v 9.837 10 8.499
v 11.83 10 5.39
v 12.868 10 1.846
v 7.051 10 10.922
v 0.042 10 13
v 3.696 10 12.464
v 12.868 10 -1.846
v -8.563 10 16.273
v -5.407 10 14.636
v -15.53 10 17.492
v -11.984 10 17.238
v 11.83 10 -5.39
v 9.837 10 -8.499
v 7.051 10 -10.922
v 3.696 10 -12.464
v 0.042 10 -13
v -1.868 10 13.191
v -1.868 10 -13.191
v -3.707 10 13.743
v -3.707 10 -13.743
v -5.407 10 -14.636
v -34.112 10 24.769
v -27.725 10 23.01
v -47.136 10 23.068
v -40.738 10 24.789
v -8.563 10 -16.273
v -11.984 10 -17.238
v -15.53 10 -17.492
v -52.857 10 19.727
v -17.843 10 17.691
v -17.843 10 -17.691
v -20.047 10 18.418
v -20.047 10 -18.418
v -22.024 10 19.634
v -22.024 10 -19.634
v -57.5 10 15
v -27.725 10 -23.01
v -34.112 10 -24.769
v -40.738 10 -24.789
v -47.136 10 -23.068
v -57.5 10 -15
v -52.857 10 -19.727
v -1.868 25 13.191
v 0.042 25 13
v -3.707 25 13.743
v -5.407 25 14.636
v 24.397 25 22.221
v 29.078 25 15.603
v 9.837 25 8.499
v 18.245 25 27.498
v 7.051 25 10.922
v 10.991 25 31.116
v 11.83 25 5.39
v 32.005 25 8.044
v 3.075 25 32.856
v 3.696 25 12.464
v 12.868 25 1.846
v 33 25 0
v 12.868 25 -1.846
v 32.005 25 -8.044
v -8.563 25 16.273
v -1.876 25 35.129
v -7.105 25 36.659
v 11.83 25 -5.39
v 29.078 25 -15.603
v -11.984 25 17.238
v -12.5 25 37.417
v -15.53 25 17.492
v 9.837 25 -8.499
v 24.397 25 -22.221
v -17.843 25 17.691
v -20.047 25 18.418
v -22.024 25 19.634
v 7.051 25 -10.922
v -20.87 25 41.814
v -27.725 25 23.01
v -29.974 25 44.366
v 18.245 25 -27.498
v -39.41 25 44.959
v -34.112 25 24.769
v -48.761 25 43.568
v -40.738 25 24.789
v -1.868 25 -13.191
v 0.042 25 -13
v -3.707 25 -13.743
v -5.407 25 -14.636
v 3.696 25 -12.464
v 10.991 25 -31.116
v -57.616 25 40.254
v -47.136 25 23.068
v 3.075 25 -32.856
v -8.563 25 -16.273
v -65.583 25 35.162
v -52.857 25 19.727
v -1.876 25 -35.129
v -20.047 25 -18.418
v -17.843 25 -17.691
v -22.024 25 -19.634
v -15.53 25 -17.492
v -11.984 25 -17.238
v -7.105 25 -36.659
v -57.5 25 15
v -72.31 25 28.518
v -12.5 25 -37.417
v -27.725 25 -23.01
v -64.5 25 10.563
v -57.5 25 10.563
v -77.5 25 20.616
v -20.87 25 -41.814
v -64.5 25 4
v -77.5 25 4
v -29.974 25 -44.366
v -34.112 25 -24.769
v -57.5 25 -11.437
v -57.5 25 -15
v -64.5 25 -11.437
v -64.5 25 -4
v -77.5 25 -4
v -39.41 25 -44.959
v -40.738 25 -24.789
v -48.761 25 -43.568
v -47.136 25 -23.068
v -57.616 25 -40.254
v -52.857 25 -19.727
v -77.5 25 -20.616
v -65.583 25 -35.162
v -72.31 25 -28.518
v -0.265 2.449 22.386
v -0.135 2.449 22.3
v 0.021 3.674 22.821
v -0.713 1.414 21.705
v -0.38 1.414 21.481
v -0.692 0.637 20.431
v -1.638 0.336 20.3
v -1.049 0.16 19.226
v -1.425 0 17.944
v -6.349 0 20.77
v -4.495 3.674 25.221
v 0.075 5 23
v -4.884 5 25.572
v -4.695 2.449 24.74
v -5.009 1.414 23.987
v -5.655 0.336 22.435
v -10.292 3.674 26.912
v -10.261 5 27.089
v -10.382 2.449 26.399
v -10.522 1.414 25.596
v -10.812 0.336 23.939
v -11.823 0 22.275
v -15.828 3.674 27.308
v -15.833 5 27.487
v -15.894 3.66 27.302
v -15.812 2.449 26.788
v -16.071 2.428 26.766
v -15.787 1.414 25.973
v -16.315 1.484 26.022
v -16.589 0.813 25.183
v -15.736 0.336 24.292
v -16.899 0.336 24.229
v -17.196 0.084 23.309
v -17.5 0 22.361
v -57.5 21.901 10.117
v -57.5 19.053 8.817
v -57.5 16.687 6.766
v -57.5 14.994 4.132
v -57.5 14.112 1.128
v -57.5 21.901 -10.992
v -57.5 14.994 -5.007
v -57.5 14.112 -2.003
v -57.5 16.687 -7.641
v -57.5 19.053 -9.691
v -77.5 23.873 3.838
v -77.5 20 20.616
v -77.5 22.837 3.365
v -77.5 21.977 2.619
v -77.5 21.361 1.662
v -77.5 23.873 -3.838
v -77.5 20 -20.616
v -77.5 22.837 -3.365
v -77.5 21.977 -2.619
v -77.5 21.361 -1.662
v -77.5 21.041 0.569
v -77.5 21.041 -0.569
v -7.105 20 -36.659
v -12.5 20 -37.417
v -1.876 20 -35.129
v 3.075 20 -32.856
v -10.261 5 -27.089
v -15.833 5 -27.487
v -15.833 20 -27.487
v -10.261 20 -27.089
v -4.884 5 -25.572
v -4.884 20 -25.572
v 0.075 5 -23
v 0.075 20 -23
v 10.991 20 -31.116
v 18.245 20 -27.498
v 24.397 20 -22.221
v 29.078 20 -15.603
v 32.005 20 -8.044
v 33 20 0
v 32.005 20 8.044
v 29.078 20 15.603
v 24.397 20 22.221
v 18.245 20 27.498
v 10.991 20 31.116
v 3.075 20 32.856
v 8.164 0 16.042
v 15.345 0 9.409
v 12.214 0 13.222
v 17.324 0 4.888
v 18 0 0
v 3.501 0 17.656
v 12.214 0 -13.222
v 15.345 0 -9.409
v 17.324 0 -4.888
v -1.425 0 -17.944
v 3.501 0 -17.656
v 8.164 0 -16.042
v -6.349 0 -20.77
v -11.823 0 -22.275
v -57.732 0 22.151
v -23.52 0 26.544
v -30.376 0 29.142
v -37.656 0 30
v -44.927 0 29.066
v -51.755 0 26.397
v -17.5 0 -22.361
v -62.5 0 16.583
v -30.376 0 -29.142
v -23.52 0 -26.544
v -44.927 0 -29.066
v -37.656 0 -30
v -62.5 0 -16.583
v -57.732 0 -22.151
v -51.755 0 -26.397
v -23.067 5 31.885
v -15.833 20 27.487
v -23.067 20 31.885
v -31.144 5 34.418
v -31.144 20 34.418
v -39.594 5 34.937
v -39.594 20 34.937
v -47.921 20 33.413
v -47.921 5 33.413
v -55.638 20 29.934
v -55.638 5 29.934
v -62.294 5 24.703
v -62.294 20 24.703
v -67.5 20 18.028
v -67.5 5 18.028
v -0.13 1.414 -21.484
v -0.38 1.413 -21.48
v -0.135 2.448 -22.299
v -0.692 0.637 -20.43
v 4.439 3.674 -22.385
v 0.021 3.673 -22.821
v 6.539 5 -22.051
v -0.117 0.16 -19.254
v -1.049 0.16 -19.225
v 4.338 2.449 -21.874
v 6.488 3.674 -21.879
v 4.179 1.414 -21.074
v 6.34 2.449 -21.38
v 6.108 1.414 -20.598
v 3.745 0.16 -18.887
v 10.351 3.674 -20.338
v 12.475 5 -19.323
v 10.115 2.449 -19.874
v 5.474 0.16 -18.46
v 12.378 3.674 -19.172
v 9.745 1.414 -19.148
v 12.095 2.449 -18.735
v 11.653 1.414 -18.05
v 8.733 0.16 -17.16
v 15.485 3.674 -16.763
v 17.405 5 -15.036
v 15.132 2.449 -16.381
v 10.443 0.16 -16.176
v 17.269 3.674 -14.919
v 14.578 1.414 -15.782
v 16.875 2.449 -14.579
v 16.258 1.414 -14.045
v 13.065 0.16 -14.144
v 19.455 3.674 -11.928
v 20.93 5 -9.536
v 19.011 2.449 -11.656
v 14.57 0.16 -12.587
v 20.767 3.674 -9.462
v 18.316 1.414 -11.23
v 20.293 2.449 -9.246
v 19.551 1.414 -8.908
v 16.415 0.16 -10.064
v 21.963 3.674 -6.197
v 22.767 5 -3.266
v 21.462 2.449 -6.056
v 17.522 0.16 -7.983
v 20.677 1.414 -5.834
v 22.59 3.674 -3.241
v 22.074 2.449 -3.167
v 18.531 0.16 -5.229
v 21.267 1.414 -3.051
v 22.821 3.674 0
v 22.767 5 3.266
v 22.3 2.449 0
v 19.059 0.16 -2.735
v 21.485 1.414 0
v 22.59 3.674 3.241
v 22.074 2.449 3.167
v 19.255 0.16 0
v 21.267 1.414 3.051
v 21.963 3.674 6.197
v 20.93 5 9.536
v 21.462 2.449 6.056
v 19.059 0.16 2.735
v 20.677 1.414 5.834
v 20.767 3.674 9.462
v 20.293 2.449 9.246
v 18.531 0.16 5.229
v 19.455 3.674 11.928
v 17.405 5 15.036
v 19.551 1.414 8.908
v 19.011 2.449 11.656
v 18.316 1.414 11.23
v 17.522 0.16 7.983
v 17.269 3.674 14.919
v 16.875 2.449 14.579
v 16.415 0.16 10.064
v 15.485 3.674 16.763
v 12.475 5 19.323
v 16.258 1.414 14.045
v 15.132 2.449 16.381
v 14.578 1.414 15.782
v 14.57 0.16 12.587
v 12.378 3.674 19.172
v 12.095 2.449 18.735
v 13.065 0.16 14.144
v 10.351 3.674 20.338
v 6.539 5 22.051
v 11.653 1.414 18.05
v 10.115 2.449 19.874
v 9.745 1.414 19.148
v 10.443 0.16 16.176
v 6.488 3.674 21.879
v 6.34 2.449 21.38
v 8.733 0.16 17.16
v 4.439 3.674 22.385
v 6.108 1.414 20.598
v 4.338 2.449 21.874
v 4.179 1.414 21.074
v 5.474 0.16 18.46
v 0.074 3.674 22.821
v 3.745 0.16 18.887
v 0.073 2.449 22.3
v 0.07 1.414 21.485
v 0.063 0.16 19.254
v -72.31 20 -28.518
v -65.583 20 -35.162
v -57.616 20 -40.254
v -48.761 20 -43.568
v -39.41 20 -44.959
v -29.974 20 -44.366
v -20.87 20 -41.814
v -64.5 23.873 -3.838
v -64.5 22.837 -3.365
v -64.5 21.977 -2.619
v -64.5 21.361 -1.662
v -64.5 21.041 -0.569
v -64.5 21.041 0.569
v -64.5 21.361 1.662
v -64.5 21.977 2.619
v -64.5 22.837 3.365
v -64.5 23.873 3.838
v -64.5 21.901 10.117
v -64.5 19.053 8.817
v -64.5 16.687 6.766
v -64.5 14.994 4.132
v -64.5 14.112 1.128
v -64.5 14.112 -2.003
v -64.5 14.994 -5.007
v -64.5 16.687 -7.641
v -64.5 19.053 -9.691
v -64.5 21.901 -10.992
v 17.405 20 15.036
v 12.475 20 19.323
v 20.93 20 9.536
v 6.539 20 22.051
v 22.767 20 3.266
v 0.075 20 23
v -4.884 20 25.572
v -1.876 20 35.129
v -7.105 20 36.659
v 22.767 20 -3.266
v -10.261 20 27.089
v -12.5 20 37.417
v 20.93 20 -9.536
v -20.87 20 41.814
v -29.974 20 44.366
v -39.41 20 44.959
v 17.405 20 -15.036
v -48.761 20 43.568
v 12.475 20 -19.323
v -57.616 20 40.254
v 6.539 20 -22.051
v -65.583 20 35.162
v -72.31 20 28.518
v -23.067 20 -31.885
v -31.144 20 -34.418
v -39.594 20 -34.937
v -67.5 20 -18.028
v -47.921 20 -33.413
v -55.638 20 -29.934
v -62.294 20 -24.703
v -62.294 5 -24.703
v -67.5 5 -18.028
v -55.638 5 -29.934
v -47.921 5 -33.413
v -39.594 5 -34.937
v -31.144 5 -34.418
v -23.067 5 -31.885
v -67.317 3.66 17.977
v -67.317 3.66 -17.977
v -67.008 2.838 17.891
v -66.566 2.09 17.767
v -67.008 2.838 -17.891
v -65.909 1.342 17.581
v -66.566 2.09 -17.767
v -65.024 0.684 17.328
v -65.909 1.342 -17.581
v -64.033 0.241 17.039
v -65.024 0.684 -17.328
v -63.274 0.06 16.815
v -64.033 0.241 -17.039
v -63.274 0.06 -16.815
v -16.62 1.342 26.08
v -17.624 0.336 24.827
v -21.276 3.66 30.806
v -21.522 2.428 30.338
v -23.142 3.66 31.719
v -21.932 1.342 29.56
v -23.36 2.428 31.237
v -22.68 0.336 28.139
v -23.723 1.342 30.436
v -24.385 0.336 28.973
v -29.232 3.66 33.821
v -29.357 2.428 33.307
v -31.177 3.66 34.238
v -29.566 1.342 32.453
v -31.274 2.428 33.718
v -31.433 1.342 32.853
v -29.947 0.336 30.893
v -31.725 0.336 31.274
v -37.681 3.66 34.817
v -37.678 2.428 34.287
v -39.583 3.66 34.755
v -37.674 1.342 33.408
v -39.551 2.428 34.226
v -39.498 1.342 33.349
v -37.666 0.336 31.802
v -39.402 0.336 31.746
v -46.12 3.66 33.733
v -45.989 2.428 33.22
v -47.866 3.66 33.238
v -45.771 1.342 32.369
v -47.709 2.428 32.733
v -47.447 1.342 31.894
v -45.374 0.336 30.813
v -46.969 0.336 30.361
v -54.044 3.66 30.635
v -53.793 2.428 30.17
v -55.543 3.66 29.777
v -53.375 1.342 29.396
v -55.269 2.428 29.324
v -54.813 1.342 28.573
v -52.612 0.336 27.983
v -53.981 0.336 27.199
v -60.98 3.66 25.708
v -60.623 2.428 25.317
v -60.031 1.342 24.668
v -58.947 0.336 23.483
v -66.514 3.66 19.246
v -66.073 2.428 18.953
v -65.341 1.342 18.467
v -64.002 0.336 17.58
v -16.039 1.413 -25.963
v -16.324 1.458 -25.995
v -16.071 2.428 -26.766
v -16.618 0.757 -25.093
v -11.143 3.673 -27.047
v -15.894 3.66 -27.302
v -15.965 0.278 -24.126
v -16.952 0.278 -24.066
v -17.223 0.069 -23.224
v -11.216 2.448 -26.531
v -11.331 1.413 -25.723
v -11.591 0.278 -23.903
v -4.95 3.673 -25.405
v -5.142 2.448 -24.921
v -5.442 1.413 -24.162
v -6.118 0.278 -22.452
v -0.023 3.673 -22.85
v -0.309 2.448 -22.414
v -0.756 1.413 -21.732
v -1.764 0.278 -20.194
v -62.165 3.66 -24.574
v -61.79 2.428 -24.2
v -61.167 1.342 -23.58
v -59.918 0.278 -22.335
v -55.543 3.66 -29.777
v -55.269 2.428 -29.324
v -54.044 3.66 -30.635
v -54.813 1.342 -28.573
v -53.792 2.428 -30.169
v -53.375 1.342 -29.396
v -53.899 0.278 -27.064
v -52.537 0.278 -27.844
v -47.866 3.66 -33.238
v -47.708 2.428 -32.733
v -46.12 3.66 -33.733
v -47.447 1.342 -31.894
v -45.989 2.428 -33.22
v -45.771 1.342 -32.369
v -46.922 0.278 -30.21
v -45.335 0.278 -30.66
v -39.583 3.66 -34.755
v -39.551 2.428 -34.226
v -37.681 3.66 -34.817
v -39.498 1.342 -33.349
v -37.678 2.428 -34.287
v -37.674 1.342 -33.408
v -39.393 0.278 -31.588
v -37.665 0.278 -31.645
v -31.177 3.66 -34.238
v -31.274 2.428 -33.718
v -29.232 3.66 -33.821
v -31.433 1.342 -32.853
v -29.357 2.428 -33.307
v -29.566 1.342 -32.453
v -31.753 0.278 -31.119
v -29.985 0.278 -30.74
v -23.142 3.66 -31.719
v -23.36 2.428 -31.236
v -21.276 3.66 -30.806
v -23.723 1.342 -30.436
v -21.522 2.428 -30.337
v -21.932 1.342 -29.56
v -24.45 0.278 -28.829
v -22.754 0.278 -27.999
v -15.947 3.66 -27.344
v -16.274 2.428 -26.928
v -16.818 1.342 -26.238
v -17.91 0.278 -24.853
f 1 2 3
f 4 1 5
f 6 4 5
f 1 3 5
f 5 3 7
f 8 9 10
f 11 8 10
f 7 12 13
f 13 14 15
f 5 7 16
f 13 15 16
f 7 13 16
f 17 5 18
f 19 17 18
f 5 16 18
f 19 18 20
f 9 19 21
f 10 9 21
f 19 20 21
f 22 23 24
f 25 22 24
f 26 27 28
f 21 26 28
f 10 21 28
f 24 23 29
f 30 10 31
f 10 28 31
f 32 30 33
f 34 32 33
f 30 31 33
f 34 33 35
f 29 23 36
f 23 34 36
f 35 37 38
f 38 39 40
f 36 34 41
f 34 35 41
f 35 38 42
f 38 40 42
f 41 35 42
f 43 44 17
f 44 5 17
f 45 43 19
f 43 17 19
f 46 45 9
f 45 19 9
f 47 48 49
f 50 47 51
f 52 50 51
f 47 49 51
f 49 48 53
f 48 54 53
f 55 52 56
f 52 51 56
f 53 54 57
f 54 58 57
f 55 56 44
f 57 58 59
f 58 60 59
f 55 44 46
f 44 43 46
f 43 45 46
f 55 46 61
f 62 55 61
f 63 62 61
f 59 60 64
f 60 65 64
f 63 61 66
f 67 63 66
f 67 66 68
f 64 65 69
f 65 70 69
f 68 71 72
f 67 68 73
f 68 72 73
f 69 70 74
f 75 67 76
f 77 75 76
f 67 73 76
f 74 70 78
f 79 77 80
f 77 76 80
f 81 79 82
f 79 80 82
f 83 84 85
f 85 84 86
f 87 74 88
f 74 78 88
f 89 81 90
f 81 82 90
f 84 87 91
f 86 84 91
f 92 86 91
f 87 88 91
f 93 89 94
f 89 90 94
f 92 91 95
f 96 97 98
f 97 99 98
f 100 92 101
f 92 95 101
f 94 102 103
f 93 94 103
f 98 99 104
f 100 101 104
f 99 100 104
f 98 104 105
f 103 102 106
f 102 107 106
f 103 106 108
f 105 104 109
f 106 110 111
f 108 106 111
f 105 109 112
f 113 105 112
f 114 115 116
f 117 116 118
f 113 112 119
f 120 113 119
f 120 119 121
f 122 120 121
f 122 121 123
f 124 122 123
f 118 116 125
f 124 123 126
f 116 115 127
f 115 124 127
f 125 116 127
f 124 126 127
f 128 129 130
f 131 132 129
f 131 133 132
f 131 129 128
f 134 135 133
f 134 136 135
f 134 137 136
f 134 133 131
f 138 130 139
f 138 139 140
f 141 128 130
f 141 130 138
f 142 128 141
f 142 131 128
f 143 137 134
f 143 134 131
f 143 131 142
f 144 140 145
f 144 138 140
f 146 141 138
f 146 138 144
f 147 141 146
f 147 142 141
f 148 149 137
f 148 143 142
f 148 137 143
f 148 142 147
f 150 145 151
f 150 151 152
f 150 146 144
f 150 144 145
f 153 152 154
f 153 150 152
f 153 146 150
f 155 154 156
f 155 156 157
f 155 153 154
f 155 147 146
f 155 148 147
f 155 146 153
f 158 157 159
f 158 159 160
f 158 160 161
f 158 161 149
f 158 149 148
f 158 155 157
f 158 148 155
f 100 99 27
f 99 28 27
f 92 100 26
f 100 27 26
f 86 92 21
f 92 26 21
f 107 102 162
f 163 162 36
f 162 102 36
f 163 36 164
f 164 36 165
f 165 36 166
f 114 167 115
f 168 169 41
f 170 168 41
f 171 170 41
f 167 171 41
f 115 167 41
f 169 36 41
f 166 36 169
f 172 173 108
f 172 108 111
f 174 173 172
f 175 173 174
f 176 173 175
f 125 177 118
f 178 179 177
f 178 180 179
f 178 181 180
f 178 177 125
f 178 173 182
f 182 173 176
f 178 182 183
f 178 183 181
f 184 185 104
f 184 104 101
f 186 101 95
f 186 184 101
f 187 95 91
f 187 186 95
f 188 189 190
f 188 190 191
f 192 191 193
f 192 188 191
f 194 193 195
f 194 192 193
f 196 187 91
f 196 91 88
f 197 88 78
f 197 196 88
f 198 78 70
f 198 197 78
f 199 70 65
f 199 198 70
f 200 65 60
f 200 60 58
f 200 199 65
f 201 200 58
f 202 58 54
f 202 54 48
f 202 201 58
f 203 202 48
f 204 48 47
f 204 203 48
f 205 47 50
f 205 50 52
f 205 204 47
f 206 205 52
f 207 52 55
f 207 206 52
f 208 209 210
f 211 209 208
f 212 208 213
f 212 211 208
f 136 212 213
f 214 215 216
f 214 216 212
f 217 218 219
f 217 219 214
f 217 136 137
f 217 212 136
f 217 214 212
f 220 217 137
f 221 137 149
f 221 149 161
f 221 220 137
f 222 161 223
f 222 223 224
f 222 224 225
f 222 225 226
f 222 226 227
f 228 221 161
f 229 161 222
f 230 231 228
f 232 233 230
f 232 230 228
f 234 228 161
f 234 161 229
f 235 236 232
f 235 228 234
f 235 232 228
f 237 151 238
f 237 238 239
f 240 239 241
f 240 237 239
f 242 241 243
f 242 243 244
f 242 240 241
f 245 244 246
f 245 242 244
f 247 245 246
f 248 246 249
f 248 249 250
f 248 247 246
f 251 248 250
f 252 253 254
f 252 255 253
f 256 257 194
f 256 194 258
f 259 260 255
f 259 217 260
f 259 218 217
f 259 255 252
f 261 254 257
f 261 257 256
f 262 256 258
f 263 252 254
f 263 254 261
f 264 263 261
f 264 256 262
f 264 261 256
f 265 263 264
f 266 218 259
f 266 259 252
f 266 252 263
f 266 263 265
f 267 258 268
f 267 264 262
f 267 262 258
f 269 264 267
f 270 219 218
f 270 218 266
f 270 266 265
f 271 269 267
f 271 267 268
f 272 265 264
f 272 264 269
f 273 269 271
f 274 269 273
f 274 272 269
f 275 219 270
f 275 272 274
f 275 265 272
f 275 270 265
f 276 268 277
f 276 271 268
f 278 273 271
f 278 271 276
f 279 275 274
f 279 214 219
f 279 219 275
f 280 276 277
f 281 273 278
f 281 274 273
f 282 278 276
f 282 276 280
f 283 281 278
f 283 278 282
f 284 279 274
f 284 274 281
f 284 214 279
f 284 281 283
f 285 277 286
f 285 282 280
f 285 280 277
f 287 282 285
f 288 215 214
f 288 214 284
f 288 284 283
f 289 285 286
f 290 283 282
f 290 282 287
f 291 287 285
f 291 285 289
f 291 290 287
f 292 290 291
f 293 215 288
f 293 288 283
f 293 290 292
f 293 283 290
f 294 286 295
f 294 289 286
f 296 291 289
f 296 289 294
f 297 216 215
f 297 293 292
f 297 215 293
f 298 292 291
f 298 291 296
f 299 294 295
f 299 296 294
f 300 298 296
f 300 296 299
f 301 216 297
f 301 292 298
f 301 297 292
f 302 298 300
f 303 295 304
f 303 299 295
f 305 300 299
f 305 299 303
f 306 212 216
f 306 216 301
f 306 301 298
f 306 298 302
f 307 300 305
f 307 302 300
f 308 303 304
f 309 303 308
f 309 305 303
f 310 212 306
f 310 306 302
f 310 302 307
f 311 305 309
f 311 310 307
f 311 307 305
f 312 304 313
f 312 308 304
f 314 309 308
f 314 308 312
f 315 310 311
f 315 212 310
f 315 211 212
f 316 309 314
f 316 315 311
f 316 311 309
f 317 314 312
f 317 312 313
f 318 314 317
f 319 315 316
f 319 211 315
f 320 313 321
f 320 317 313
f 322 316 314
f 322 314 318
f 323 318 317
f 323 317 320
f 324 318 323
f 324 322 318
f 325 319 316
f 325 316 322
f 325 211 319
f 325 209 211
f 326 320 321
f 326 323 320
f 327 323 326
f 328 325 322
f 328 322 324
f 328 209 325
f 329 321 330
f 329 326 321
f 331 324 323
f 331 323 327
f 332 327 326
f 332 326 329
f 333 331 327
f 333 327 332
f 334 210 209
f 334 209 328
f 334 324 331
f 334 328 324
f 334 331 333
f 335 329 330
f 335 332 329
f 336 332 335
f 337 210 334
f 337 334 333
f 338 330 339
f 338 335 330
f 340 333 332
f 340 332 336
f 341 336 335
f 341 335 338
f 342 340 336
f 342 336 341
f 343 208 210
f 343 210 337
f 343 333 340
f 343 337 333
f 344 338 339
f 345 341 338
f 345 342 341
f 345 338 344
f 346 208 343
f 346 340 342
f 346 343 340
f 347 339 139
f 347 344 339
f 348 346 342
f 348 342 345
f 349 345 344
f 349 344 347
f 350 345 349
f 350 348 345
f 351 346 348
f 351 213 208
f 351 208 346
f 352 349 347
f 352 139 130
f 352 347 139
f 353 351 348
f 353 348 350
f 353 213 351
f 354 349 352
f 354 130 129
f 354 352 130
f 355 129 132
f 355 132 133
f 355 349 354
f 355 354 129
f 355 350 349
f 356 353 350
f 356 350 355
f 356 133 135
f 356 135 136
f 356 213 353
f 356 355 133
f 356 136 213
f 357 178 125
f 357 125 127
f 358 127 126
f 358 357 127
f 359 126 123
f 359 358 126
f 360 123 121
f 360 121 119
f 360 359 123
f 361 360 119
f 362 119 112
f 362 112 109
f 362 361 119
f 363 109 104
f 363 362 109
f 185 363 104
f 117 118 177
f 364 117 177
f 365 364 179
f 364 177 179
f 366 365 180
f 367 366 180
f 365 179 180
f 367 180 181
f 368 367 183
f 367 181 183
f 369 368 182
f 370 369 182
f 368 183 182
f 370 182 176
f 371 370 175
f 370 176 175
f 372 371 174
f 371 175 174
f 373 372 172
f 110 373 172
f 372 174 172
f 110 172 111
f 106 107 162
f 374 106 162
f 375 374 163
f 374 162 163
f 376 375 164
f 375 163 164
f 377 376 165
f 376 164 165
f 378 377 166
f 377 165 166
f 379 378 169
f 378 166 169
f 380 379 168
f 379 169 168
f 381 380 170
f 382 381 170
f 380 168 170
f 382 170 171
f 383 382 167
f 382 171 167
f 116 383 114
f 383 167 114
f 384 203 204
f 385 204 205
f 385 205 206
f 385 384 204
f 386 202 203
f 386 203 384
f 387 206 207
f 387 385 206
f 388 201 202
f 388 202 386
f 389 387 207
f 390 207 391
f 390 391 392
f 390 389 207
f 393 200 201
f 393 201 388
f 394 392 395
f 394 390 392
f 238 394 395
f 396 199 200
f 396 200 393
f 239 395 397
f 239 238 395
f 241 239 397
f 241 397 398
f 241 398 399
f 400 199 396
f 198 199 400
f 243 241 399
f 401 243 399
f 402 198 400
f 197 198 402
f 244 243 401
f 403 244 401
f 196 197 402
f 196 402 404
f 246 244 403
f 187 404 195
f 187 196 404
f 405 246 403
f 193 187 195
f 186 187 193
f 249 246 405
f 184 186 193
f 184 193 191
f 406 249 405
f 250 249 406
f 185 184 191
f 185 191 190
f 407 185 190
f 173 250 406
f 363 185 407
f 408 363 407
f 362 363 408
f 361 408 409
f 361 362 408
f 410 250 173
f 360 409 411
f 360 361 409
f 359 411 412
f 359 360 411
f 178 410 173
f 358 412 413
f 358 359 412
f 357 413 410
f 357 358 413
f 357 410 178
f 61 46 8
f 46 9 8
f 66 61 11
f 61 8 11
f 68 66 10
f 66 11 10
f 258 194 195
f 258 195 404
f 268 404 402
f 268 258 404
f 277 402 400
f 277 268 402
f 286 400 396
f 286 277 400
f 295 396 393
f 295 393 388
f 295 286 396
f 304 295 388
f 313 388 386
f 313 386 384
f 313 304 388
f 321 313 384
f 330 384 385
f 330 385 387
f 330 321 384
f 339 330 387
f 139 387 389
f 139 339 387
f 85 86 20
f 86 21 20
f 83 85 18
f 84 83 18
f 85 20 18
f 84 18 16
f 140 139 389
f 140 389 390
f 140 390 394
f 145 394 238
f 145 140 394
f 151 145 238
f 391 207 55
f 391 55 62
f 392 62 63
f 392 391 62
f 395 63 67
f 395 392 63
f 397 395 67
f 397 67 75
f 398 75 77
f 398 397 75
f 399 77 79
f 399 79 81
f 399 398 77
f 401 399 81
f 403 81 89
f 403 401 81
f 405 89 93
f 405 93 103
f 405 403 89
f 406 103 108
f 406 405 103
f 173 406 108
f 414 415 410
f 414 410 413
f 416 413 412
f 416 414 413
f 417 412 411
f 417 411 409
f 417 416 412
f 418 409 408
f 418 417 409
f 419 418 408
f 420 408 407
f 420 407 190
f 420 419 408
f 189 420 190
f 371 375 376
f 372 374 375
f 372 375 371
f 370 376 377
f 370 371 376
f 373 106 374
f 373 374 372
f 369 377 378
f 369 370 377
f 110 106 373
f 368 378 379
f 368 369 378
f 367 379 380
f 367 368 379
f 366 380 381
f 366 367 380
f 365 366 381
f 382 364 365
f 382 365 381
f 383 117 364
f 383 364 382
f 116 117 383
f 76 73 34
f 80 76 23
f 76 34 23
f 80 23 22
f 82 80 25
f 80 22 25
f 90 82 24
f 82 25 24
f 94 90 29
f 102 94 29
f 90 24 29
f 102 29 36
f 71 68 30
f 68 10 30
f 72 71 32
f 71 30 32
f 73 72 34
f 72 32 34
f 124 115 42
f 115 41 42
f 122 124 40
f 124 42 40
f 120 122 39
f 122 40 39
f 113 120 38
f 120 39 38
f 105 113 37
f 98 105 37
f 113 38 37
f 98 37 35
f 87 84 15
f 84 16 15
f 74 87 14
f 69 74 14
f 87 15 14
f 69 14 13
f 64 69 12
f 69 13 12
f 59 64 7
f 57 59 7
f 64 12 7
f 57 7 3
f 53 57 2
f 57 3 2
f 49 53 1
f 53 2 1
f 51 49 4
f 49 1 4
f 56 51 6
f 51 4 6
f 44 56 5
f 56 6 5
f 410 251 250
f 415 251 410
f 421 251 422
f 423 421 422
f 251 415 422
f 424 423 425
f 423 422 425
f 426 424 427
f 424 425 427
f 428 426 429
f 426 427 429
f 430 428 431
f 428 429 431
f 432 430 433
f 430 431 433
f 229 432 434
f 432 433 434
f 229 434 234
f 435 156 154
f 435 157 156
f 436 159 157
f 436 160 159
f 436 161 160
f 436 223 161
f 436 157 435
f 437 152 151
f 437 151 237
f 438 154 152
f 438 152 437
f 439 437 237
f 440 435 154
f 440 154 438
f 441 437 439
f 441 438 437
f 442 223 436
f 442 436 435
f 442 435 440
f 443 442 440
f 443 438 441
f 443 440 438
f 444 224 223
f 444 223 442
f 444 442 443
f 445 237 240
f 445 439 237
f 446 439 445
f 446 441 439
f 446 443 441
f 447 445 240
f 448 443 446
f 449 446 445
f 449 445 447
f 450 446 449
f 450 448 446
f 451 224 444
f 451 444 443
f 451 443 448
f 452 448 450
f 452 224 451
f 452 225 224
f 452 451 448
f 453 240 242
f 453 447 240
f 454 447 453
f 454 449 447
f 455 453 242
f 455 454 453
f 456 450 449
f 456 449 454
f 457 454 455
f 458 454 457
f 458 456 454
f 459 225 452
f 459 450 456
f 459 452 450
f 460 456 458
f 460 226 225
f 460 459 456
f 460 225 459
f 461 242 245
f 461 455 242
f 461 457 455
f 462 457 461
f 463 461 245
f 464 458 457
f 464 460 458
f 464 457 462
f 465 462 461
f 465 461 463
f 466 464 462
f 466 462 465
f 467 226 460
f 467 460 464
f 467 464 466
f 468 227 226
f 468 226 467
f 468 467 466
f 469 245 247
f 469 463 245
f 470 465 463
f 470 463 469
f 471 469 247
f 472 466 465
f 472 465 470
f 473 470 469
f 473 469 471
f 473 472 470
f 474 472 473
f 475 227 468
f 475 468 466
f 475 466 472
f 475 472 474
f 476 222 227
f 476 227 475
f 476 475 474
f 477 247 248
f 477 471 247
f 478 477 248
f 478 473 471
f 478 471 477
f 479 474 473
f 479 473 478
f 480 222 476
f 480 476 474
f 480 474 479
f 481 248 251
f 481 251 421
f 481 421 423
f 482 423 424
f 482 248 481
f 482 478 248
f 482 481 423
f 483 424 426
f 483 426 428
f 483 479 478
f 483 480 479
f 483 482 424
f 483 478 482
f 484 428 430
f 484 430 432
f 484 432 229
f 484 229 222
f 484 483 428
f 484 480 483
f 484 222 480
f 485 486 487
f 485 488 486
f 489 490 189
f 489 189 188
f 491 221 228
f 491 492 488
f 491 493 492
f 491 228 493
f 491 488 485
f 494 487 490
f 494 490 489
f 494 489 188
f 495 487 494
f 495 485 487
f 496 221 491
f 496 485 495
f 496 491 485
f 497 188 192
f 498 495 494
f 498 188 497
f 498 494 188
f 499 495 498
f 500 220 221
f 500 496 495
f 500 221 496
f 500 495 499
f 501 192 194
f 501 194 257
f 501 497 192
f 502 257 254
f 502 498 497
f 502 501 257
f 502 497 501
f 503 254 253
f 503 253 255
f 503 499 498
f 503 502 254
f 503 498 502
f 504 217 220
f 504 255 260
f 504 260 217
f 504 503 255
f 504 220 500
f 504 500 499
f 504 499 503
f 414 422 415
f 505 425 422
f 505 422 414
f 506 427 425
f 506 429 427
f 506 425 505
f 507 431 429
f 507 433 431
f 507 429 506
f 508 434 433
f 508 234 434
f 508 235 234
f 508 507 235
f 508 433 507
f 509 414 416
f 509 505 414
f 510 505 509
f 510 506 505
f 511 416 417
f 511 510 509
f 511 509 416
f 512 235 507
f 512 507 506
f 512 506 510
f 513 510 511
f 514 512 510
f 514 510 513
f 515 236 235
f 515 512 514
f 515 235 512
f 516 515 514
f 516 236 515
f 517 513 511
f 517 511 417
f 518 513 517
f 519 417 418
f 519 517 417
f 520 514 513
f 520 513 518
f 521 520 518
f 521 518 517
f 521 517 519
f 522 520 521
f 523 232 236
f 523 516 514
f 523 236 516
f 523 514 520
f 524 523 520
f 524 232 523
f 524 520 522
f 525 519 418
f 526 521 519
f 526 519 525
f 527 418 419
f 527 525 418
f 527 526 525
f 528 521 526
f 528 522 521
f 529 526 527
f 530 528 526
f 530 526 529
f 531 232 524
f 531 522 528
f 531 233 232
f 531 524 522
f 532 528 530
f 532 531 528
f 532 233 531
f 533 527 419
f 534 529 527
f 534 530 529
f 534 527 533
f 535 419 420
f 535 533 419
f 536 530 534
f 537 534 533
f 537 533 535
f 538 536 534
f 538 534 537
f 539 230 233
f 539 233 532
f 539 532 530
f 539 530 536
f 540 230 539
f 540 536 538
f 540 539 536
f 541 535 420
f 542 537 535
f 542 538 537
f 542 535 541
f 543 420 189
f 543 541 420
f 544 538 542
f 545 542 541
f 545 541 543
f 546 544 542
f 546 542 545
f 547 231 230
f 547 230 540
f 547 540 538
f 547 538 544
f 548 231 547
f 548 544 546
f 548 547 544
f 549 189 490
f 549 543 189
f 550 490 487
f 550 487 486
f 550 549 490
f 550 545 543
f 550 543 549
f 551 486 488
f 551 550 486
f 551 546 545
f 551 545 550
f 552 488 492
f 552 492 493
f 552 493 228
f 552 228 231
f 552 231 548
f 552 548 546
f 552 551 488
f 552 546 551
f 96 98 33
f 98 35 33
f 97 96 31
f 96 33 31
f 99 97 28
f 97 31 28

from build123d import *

# Parameters (mm, degrees)
SKETCH1_R           = 4
SKETCH1_R_2         = 11
BOSS_EXTRUDE1_DEPTH = 10
BOSS_EXTRUDE2_DEPTH = 20
BOSS_EXTRUDE3_DEPTH = 5
SKETCH6_R           = 11
CUT_EXTRUDE2_DEPTH  = 7
CUT_EXTRUDE3_REACH  = 123.903
SKETCH3_R           = 4
FILLET1_R           = 5


with BuildPart() as part:
    # Sketch1 → Boss-Extrude1 (new body)
    # profile 1 of 4: a face of its own
    with BuildSketch(Plane(origin=(0, 0, 0), x_dir=(1, 0, 0), z_dir=(0, 1, 0))):
        with BuildLine():
            ThreePointArc((-15.53030303, -17.49196326), (-18.965809959, -17.990656132), (-22.023809524, -19.633836312))
            ThreePointArc((-22.023809524, -19.633836312), (-40.737950416, -24.78942672), (-57.5, -15))
            Line((-57.5, -15), (-57.5, 15))
            ThreePointArc((-57.5, 15), (-40.737950416, 24.78942672), (-22.023809524, 19.633836312))
            ThreePointArc((-22.023809524, 19.633836312), (-18.965809959, 17.990656132), (-15.53030303, 17.49196326))
            ThreePointArc((-15.53030303, 17.49196326), (-10.248929974, 16.842723462), (-5.406818182, 14.63628582))
            ThreePointArc((-5.406818182, 14.63628582), (-2.801045952, 13.422385369), (0.042391304, 12.999930884))
            ThreePointArc((0.042391304, 12.999930884), (13, 0), (0.042391304, -12.999930884))
            ThreePointArc((0.042391304, -12.999930884), (-2.801045952, -13.422385369), (-5.406818182, -14.63628582))
            ThreePointArc((-5.406818182, -14.63628582), (-10.248929974, -16.842723462), (-15.53030303, -17.49196326))
        make_face()
        with Locations((-37.5, 0)):
            Circle(SKETCH1_R, mode=Mode.SUBTRACT)
        Circle(SKETCH1_R_2, mode=Mode.SUBTRACT)
        with Locations((-15, 0)):
            Circle(SKETCH1_R, mode=Mode.SUBTRACT)
    # profile 2 of 4: a face of its own
    with BuildSketch(Plane(origin=(0, 0, 0), x_dir=(1, 0, 0), z_dir=(0, 1, 0))):
        with Locations((-37.5, 0)):
            Circle(SKETCH1_R)
    # profile 3 of 4: a face of its own
    with BuildSketch(Plane(origin=(0, 0, 0), x_dir=(1, 0, 0), z_dir=(0, 1, 0))):
        with Locations((-15, 0)):
            Circle(SKETCH1_R)
    # profile 4 of 4: a face of its own
    with BuildSketch(Plane(origin=(0, 0, 0), x_dir=(1, 0, 0), z_dir=(0, 1, 0))):
        Circle(SKETCH1_R_2)
    extrude(amount=BOSS_EXTRUDE1_DEPTH)

    # Sketch1<3> → Boss-Extrude2 (add)
    with BuildSketch(Plane(origin=(0, 0, 0), x_dir=(1, 0, 0), z_dir=(0, 1, 0))):
        with BuildLine():
            Line((-67.5, -18.027756377), (-67.5, 18.027756377))
            ThreePointArc((-67.5, 18.027756377), (-43.803347329, 34.427718665), (-15.833333333, 27.487370837))
            ThreePointArc((-15.833333333, 27.487370837), (-7.534032816, 26.467136868), (0.075, 22.999877717))
            ThreePointArc((0.075, 22.999877717), (23, 0), (0.075, -22.999877717))
            ThreePointArc((0.075, -22.999877717), (-7.534032816, -26.467136868), (-15.833333333, -27.487370837))
            ThreePointArc((-15.833333333, -27.487370837), (-43.803347329, -34.427718665), (-67.5, -18.027756377))
        make_face()
        with BuildLine():
            Line((-57.5, -15), (-57.5, 15))
            ThreePointArc((-57.5, 15), (-40.737950416, 24.78942672), (-22.023809524, 19.633836312))
            ThreePointArc((-22.023809524, 19.633836312), (-18.965809959, 17.990656132), (-15.53030303, 17.49196326))
            ThreePointArc((-15.53030303, 17.49196326), (-10.248929974, 16.842723462), (-5.406818182, 14.63628582))
            ThreePointArc((-5.406818182, 14.63628582), (-2.801045952, 13.422385369), (0.042391304, 12.999930884))
            ThreePointArc((0.042391304, 12.999930884), (13, 0), (0.042391304, -12.999930884))
            ThreePointArc((0.042391304, -12.999930884), (-2.801045952, -13.422385369), (-5.406818182, -14.63628582))
            ThreePointArc((-5.406818182, -14.63628582), (-10.248929974, -16.842723462), (-15.53030303, -17.49196326))
            ThreePointArc((-15.53030303, -17.49196326), (-18.965809959, -17.990656132), (-22.023809524, -19.633836312))
            ThreePointArc((-22.023809524, -19.633836312), (-40.737950416, -24.78942672), (-57.5, -15))
        make_face(mode=Mode.SUBTRACT)
    extrude(amount=BOSS_EXTRUDE2_DEPTH)

    # Sketch2 → Boss-Extrude3 (add)
    with BuildSketch(Plane(origin=(0, 20, 0), x_dir=(1, 0, 0), z_dir=(0, 1, 0))):
        with BuildLine():
            Line((-77.5, -20.615528128), (-77.5, 20.615528128))
            ThreePointArc((-77.5, 20.615528128), (-48.761384661, 43.568121551), (-12.5, 37.416573868))
            ThreePointArc((-12.5, 37.416573868), (-4.462855904, 35.989145507), (3.075, 32.856420605))
            ThreePointArc((3.075, 32.856420605), (33, 0), (3.075, -32.856420605))
            ThreePointArc((3.075, -32.856420605), (-4.462855904, -35.989145507), (-12.5, -37.416573868))
            ThreePointArc((-12.5, -37.416573868), (-48.761384661, -43.568121551), (-77.5, -20.615528128))
        make_face()
        with BuildLine():
            Line((-57.5, -15), (-57.5, 15))
            ThreePointArc((-57.5, 15), (-40.737950416, 24.78942672), (-22.023809524, 19.633836312))
            ThreePointArc((-22.023809524, 19.633836312), (-18.965809959, 17.990656132), (-15.53030303, 17.49196326))
            ThreePointArc((-15.53030303, 17.49196326), (-10.248929974, 16.842723462), (-5.406818182, 14.63628582))
            ThreePointArc((-5.406818182, 14.63628582), (-2.801045952, 13.422385369), (0.042391304, 12.999930884))
            ThreePointArc((0.042391304, 12.999930884), (13, 0), (0.042391304, -12.999930884))
            ThreePointArc((0.042391304, -12.999930884), (-2.801045952, -13.422385369), (-5.406818182, -14.63628582))
            ThreePointArc((-5.406818182, -14.63628582), (-10.248929974, -16.842723462), (-15.53030303, -17.49196326))
            ThreePointArc((-15.53030303, -17.49196326), (-18.965809959, -17.990656132), (-22.023809524, -19.633836312))
            ThreePointArc((-22.023809524, -19.633836312), (-40.737950416, -24.78942672), (-57.5, -15))
        make_face(mode=Mode.SUBTRACT)
    extrude(amount=BOSS_EXTRUDE3_DEPTH)

    # Sketch6 → Cut-Extrude2 (cut)
    with BuildSketch(Plane(origin=(-57.5, 0, 0), x_dir=(0, 0, -1), z_dir=(1, 0, 0))):
        with Locations((0.437281594, 25)):
            Circle(SKETCH6_R)
    extrude(amount=-CUT_EXTRUDE2_DEPTH, mode=Mode.SUBTRACT)

    # Sketch3 → Cut-Extrude3 (cut, up to next)
    with BuildSketch(Plane.ZY.offset(77.5), mode=Mode.PRIVATE) as cut_extrude3_sk1:
        with Locations((0, 25)):
            Circle(SKETCH3_R)
    cut_extrude3_tool1 = extrude(cut_extrude3_sk1.sketch, amount=-CUT_EXTRUDE3_REACH, mode=Mode.PRIVATE) & part.part
    add(cut_extrude3_tool1.solids().sort_by_distance((-77.5, 25, 0))[0], mode=Mode.SUBTRACT)

    # Fillet1
    fillet1_edges = [part.edges().sort_by_distance(p)[0] for p in [
        (-43.803347329, 0, 34.427718665),
        (-7.534032816, 0, 26.467136868),
        (23, 0, 0),
        (-7.534032816, 0, -26.467136868),
        (-43.803347329, 0, -34.427718665),
        (-67.5, 0, 0),
    ]]
    fillet(fillet1_edges, radius=FILLET1_R - 0.0001)  # a hair under: the kernel refuses the full size


solid = part.part
